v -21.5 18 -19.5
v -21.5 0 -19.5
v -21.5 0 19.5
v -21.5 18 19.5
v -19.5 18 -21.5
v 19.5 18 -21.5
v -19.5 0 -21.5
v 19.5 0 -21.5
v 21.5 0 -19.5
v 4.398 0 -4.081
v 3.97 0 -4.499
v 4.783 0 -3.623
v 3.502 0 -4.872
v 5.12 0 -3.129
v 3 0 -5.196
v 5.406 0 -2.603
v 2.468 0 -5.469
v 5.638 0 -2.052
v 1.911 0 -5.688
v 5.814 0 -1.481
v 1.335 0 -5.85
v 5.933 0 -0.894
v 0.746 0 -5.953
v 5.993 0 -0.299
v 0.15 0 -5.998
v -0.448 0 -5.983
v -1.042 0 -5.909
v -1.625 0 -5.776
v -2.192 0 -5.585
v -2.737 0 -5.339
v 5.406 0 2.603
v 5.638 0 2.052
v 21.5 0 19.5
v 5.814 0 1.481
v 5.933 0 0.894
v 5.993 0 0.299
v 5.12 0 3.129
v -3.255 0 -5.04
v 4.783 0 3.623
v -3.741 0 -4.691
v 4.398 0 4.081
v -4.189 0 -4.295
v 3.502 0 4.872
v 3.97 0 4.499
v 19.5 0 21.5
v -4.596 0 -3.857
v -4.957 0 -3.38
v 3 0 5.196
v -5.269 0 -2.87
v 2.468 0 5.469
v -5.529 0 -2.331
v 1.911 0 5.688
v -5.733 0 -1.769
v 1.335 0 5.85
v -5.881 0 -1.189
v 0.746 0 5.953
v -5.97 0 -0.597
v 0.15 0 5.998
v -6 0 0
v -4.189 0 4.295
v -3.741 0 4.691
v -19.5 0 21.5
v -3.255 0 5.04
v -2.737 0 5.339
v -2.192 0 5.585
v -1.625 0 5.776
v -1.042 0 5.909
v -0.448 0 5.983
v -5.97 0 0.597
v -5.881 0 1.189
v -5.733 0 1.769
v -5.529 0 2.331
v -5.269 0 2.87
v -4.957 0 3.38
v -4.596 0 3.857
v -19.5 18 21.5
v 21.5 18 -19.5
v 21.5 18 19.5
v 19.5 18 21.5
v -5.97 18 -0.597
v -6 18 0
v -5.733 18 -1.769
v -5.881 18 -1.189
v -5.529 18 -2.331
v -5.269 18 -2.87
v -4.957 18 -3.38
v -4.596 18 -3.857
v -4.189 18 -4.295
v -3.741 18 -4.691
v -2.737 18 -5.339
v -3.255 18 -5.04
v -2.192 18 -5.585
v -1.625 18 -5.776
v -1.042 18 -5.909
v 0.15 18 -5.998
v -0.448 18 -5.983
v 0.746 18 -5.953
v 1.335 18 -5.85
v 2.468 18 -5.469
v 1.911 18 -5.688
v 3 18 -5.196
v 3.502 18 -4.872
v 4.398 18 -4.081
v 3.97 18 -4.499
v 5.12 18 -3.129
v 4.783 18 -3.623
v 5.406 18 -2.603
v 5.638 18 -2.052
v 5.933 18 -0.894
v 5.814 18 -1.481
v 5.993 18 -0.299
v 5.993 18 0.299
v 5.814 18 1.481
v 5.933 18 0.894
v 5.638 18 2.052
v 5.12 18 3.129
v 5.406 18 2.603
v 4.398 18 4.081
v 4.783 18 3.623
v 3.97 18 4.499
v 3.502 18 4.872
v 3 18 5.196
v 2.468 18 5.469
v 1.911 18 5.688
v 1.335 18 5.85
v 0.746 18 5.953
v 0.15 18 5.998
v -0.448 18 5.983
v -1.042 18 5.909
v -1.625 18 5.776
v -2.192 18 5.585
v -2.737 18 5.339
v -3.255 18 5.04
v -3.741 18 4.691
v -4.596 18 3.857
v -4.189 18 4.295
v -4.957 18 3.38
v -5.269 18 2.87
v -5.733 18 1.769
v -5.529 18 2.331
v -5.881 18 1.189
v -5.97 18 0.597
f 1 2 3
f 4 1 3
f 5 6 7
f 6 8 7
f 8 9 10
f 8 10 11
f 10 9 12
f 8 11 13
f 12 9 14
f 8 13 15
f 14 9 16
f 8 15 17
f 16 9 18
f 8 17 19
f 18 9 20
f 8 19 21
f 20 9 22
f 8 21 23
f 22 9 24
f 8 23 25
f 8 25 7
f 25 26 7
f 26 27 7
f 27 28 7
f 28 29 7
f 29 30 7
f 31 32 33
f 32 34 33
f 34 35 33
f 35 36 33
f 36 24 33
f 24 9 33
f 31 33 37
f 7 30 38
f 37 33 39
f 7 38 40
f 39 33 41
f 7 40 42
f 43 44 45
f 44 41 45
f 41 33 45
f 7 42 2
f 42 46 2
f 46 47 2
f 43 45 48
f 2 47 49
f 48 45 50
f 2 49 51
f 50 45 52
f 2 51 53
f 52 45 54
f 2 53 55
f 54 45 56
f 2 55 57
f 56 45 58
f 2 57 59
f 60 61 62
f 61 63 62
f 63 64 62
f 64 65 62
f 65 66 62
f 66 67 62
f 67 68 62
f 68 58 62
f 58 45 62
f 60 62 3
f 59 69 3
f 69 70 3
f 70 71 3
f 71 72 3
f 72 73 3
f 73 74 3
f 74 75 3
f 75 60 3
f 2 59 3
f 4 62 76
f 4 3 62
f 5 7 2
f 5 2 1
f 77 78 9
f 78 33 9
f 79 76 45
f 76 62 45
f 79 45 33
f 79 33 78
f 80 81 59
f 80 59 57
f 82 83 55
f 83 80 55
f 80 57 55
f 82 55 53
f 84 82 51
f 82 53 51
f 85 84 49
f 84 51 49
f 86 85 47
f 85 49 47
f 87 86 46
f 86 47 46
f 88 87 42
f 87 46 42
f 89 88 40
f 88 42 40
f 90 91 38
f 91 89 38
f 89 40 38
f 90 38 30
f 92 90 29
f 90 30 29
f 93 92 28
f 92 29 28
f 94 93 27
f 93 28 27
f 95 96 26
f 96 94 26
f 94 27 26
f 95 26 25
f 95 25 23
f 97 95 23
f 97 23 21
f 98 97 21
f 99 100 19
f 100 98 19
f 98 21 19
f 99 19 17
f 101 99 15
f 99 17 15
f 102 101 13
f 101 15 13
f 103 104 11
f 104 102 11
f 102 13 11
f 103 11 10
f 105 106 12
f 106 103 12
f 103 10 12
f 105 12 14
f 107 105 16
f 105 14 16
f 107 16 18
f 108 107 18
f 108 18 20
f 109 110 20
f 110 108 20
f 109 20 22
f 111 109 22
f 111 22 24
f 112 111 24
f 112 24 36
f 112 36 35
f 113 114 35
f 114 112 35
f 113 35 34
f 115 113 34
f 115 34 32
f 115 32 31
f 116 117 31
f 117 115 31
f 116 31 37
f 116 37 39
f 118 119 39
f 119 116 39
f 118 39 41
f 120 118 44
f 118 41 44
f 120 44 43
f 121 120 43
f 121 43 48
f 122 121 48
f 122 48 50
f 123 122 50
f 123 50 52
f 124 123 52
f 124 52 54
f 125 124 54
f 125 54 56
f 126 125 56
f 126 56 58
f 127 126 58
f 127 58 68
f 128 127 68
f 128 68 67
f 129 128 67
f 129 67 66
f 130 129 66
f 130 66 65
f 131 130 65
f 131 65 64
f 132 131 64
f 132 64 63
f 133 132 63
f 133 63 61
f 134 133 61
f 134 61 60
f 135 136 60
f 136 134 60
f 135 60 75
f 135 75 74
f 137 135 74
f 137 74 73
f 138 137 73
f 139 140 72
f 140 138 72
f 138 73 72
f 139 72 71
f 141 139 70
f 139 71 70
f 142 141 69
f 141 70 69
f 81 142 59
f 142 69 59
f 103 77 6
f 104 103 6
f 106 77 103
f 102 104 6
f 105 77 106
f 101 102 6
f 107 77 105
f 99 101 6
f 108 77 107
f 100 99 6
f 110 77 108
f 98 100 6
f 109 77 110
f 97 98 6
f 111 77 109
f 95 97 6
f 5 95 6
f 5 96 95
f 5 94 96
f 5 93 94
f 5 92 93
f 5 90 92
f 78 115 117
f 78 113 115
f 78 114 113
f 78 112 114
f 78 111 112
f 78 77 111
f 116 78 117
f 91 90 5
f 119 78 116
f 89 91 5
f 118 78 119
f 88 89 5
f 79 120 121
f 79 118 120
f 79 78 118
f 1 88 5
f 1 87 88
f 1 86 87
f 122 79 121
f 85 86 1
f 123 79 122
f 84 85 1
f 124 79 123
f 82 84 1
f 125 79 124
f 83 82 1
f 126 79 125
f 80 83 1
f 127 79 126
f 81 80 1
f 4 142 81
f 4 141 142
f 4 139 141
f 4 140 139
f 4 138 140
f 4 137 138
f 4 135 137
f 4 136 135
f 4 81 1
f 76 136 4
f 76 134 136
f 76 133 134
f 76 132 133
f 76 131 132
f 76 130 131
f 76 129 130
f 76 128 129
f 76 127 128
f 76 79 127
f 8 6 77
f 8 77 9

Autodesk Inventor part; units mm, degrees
ref_plane "YZ Plane" through (0, 0, 0) normal (1, 0, 0) x (0, 1, 0)
ref_plane "XZ Plane" through (0, 0, 0) normal (0, 1, 0) x (-1, 0, 0)
ref_plane "XY Plane" through (0, 0, 0) normal (0, 0, 1) x (1, 0, 0)
sketch "スケッチ1" plane through (0, 0, 0) normal (0, 1, 0) x (-1, 0, 0)
  line L0 (-21.5, -21.5) -> (21.5, -21.5)
  line L1 (21.5, -21.5) -> (21.5, 21.5)
  line L2 (21.5, 21.5) -> (-21.5, 21.5)
  line L3 (-21.5, 21.5) -> (-21.5, -21.5)
  line L4 (-21.5, -21.5) -> (21.5, 21.5) construction
  line L5 (21.5, -21.5) -> (-21.5, 21.5) construction
  point P0 (0, 0)
  dimension "d0" = 43
  dimension "d1" = 43
extrude "押し出し1" add sketch "スケッチ1" along normal blind 18
chamfer "面取り1" distance 2 angle 45 1 edges at (21.5, 9, 21.5)
chamfer "面取り2" distance 2 angle 45 1 edges at (21.5, 9, -21.5)
chamfer "面取り3" distance 2 angle 45 1 edges at (-21.5, 9, 21.5)
chamfer "面取り4" distance 2 angle 45 1 edges at (-21.5, 9, -21.5)
sketch "スケッチ2" plane through (0, 0, 0) normal (0, 1, 0) x (-1, 0, 0)
  circle A0 centre (0, 0) radius 6
  dimension "d16" = 12
extrude "押し出し2" cut sketch "スケッチ2" along normal blind 18
properties part number "GearHead1"
